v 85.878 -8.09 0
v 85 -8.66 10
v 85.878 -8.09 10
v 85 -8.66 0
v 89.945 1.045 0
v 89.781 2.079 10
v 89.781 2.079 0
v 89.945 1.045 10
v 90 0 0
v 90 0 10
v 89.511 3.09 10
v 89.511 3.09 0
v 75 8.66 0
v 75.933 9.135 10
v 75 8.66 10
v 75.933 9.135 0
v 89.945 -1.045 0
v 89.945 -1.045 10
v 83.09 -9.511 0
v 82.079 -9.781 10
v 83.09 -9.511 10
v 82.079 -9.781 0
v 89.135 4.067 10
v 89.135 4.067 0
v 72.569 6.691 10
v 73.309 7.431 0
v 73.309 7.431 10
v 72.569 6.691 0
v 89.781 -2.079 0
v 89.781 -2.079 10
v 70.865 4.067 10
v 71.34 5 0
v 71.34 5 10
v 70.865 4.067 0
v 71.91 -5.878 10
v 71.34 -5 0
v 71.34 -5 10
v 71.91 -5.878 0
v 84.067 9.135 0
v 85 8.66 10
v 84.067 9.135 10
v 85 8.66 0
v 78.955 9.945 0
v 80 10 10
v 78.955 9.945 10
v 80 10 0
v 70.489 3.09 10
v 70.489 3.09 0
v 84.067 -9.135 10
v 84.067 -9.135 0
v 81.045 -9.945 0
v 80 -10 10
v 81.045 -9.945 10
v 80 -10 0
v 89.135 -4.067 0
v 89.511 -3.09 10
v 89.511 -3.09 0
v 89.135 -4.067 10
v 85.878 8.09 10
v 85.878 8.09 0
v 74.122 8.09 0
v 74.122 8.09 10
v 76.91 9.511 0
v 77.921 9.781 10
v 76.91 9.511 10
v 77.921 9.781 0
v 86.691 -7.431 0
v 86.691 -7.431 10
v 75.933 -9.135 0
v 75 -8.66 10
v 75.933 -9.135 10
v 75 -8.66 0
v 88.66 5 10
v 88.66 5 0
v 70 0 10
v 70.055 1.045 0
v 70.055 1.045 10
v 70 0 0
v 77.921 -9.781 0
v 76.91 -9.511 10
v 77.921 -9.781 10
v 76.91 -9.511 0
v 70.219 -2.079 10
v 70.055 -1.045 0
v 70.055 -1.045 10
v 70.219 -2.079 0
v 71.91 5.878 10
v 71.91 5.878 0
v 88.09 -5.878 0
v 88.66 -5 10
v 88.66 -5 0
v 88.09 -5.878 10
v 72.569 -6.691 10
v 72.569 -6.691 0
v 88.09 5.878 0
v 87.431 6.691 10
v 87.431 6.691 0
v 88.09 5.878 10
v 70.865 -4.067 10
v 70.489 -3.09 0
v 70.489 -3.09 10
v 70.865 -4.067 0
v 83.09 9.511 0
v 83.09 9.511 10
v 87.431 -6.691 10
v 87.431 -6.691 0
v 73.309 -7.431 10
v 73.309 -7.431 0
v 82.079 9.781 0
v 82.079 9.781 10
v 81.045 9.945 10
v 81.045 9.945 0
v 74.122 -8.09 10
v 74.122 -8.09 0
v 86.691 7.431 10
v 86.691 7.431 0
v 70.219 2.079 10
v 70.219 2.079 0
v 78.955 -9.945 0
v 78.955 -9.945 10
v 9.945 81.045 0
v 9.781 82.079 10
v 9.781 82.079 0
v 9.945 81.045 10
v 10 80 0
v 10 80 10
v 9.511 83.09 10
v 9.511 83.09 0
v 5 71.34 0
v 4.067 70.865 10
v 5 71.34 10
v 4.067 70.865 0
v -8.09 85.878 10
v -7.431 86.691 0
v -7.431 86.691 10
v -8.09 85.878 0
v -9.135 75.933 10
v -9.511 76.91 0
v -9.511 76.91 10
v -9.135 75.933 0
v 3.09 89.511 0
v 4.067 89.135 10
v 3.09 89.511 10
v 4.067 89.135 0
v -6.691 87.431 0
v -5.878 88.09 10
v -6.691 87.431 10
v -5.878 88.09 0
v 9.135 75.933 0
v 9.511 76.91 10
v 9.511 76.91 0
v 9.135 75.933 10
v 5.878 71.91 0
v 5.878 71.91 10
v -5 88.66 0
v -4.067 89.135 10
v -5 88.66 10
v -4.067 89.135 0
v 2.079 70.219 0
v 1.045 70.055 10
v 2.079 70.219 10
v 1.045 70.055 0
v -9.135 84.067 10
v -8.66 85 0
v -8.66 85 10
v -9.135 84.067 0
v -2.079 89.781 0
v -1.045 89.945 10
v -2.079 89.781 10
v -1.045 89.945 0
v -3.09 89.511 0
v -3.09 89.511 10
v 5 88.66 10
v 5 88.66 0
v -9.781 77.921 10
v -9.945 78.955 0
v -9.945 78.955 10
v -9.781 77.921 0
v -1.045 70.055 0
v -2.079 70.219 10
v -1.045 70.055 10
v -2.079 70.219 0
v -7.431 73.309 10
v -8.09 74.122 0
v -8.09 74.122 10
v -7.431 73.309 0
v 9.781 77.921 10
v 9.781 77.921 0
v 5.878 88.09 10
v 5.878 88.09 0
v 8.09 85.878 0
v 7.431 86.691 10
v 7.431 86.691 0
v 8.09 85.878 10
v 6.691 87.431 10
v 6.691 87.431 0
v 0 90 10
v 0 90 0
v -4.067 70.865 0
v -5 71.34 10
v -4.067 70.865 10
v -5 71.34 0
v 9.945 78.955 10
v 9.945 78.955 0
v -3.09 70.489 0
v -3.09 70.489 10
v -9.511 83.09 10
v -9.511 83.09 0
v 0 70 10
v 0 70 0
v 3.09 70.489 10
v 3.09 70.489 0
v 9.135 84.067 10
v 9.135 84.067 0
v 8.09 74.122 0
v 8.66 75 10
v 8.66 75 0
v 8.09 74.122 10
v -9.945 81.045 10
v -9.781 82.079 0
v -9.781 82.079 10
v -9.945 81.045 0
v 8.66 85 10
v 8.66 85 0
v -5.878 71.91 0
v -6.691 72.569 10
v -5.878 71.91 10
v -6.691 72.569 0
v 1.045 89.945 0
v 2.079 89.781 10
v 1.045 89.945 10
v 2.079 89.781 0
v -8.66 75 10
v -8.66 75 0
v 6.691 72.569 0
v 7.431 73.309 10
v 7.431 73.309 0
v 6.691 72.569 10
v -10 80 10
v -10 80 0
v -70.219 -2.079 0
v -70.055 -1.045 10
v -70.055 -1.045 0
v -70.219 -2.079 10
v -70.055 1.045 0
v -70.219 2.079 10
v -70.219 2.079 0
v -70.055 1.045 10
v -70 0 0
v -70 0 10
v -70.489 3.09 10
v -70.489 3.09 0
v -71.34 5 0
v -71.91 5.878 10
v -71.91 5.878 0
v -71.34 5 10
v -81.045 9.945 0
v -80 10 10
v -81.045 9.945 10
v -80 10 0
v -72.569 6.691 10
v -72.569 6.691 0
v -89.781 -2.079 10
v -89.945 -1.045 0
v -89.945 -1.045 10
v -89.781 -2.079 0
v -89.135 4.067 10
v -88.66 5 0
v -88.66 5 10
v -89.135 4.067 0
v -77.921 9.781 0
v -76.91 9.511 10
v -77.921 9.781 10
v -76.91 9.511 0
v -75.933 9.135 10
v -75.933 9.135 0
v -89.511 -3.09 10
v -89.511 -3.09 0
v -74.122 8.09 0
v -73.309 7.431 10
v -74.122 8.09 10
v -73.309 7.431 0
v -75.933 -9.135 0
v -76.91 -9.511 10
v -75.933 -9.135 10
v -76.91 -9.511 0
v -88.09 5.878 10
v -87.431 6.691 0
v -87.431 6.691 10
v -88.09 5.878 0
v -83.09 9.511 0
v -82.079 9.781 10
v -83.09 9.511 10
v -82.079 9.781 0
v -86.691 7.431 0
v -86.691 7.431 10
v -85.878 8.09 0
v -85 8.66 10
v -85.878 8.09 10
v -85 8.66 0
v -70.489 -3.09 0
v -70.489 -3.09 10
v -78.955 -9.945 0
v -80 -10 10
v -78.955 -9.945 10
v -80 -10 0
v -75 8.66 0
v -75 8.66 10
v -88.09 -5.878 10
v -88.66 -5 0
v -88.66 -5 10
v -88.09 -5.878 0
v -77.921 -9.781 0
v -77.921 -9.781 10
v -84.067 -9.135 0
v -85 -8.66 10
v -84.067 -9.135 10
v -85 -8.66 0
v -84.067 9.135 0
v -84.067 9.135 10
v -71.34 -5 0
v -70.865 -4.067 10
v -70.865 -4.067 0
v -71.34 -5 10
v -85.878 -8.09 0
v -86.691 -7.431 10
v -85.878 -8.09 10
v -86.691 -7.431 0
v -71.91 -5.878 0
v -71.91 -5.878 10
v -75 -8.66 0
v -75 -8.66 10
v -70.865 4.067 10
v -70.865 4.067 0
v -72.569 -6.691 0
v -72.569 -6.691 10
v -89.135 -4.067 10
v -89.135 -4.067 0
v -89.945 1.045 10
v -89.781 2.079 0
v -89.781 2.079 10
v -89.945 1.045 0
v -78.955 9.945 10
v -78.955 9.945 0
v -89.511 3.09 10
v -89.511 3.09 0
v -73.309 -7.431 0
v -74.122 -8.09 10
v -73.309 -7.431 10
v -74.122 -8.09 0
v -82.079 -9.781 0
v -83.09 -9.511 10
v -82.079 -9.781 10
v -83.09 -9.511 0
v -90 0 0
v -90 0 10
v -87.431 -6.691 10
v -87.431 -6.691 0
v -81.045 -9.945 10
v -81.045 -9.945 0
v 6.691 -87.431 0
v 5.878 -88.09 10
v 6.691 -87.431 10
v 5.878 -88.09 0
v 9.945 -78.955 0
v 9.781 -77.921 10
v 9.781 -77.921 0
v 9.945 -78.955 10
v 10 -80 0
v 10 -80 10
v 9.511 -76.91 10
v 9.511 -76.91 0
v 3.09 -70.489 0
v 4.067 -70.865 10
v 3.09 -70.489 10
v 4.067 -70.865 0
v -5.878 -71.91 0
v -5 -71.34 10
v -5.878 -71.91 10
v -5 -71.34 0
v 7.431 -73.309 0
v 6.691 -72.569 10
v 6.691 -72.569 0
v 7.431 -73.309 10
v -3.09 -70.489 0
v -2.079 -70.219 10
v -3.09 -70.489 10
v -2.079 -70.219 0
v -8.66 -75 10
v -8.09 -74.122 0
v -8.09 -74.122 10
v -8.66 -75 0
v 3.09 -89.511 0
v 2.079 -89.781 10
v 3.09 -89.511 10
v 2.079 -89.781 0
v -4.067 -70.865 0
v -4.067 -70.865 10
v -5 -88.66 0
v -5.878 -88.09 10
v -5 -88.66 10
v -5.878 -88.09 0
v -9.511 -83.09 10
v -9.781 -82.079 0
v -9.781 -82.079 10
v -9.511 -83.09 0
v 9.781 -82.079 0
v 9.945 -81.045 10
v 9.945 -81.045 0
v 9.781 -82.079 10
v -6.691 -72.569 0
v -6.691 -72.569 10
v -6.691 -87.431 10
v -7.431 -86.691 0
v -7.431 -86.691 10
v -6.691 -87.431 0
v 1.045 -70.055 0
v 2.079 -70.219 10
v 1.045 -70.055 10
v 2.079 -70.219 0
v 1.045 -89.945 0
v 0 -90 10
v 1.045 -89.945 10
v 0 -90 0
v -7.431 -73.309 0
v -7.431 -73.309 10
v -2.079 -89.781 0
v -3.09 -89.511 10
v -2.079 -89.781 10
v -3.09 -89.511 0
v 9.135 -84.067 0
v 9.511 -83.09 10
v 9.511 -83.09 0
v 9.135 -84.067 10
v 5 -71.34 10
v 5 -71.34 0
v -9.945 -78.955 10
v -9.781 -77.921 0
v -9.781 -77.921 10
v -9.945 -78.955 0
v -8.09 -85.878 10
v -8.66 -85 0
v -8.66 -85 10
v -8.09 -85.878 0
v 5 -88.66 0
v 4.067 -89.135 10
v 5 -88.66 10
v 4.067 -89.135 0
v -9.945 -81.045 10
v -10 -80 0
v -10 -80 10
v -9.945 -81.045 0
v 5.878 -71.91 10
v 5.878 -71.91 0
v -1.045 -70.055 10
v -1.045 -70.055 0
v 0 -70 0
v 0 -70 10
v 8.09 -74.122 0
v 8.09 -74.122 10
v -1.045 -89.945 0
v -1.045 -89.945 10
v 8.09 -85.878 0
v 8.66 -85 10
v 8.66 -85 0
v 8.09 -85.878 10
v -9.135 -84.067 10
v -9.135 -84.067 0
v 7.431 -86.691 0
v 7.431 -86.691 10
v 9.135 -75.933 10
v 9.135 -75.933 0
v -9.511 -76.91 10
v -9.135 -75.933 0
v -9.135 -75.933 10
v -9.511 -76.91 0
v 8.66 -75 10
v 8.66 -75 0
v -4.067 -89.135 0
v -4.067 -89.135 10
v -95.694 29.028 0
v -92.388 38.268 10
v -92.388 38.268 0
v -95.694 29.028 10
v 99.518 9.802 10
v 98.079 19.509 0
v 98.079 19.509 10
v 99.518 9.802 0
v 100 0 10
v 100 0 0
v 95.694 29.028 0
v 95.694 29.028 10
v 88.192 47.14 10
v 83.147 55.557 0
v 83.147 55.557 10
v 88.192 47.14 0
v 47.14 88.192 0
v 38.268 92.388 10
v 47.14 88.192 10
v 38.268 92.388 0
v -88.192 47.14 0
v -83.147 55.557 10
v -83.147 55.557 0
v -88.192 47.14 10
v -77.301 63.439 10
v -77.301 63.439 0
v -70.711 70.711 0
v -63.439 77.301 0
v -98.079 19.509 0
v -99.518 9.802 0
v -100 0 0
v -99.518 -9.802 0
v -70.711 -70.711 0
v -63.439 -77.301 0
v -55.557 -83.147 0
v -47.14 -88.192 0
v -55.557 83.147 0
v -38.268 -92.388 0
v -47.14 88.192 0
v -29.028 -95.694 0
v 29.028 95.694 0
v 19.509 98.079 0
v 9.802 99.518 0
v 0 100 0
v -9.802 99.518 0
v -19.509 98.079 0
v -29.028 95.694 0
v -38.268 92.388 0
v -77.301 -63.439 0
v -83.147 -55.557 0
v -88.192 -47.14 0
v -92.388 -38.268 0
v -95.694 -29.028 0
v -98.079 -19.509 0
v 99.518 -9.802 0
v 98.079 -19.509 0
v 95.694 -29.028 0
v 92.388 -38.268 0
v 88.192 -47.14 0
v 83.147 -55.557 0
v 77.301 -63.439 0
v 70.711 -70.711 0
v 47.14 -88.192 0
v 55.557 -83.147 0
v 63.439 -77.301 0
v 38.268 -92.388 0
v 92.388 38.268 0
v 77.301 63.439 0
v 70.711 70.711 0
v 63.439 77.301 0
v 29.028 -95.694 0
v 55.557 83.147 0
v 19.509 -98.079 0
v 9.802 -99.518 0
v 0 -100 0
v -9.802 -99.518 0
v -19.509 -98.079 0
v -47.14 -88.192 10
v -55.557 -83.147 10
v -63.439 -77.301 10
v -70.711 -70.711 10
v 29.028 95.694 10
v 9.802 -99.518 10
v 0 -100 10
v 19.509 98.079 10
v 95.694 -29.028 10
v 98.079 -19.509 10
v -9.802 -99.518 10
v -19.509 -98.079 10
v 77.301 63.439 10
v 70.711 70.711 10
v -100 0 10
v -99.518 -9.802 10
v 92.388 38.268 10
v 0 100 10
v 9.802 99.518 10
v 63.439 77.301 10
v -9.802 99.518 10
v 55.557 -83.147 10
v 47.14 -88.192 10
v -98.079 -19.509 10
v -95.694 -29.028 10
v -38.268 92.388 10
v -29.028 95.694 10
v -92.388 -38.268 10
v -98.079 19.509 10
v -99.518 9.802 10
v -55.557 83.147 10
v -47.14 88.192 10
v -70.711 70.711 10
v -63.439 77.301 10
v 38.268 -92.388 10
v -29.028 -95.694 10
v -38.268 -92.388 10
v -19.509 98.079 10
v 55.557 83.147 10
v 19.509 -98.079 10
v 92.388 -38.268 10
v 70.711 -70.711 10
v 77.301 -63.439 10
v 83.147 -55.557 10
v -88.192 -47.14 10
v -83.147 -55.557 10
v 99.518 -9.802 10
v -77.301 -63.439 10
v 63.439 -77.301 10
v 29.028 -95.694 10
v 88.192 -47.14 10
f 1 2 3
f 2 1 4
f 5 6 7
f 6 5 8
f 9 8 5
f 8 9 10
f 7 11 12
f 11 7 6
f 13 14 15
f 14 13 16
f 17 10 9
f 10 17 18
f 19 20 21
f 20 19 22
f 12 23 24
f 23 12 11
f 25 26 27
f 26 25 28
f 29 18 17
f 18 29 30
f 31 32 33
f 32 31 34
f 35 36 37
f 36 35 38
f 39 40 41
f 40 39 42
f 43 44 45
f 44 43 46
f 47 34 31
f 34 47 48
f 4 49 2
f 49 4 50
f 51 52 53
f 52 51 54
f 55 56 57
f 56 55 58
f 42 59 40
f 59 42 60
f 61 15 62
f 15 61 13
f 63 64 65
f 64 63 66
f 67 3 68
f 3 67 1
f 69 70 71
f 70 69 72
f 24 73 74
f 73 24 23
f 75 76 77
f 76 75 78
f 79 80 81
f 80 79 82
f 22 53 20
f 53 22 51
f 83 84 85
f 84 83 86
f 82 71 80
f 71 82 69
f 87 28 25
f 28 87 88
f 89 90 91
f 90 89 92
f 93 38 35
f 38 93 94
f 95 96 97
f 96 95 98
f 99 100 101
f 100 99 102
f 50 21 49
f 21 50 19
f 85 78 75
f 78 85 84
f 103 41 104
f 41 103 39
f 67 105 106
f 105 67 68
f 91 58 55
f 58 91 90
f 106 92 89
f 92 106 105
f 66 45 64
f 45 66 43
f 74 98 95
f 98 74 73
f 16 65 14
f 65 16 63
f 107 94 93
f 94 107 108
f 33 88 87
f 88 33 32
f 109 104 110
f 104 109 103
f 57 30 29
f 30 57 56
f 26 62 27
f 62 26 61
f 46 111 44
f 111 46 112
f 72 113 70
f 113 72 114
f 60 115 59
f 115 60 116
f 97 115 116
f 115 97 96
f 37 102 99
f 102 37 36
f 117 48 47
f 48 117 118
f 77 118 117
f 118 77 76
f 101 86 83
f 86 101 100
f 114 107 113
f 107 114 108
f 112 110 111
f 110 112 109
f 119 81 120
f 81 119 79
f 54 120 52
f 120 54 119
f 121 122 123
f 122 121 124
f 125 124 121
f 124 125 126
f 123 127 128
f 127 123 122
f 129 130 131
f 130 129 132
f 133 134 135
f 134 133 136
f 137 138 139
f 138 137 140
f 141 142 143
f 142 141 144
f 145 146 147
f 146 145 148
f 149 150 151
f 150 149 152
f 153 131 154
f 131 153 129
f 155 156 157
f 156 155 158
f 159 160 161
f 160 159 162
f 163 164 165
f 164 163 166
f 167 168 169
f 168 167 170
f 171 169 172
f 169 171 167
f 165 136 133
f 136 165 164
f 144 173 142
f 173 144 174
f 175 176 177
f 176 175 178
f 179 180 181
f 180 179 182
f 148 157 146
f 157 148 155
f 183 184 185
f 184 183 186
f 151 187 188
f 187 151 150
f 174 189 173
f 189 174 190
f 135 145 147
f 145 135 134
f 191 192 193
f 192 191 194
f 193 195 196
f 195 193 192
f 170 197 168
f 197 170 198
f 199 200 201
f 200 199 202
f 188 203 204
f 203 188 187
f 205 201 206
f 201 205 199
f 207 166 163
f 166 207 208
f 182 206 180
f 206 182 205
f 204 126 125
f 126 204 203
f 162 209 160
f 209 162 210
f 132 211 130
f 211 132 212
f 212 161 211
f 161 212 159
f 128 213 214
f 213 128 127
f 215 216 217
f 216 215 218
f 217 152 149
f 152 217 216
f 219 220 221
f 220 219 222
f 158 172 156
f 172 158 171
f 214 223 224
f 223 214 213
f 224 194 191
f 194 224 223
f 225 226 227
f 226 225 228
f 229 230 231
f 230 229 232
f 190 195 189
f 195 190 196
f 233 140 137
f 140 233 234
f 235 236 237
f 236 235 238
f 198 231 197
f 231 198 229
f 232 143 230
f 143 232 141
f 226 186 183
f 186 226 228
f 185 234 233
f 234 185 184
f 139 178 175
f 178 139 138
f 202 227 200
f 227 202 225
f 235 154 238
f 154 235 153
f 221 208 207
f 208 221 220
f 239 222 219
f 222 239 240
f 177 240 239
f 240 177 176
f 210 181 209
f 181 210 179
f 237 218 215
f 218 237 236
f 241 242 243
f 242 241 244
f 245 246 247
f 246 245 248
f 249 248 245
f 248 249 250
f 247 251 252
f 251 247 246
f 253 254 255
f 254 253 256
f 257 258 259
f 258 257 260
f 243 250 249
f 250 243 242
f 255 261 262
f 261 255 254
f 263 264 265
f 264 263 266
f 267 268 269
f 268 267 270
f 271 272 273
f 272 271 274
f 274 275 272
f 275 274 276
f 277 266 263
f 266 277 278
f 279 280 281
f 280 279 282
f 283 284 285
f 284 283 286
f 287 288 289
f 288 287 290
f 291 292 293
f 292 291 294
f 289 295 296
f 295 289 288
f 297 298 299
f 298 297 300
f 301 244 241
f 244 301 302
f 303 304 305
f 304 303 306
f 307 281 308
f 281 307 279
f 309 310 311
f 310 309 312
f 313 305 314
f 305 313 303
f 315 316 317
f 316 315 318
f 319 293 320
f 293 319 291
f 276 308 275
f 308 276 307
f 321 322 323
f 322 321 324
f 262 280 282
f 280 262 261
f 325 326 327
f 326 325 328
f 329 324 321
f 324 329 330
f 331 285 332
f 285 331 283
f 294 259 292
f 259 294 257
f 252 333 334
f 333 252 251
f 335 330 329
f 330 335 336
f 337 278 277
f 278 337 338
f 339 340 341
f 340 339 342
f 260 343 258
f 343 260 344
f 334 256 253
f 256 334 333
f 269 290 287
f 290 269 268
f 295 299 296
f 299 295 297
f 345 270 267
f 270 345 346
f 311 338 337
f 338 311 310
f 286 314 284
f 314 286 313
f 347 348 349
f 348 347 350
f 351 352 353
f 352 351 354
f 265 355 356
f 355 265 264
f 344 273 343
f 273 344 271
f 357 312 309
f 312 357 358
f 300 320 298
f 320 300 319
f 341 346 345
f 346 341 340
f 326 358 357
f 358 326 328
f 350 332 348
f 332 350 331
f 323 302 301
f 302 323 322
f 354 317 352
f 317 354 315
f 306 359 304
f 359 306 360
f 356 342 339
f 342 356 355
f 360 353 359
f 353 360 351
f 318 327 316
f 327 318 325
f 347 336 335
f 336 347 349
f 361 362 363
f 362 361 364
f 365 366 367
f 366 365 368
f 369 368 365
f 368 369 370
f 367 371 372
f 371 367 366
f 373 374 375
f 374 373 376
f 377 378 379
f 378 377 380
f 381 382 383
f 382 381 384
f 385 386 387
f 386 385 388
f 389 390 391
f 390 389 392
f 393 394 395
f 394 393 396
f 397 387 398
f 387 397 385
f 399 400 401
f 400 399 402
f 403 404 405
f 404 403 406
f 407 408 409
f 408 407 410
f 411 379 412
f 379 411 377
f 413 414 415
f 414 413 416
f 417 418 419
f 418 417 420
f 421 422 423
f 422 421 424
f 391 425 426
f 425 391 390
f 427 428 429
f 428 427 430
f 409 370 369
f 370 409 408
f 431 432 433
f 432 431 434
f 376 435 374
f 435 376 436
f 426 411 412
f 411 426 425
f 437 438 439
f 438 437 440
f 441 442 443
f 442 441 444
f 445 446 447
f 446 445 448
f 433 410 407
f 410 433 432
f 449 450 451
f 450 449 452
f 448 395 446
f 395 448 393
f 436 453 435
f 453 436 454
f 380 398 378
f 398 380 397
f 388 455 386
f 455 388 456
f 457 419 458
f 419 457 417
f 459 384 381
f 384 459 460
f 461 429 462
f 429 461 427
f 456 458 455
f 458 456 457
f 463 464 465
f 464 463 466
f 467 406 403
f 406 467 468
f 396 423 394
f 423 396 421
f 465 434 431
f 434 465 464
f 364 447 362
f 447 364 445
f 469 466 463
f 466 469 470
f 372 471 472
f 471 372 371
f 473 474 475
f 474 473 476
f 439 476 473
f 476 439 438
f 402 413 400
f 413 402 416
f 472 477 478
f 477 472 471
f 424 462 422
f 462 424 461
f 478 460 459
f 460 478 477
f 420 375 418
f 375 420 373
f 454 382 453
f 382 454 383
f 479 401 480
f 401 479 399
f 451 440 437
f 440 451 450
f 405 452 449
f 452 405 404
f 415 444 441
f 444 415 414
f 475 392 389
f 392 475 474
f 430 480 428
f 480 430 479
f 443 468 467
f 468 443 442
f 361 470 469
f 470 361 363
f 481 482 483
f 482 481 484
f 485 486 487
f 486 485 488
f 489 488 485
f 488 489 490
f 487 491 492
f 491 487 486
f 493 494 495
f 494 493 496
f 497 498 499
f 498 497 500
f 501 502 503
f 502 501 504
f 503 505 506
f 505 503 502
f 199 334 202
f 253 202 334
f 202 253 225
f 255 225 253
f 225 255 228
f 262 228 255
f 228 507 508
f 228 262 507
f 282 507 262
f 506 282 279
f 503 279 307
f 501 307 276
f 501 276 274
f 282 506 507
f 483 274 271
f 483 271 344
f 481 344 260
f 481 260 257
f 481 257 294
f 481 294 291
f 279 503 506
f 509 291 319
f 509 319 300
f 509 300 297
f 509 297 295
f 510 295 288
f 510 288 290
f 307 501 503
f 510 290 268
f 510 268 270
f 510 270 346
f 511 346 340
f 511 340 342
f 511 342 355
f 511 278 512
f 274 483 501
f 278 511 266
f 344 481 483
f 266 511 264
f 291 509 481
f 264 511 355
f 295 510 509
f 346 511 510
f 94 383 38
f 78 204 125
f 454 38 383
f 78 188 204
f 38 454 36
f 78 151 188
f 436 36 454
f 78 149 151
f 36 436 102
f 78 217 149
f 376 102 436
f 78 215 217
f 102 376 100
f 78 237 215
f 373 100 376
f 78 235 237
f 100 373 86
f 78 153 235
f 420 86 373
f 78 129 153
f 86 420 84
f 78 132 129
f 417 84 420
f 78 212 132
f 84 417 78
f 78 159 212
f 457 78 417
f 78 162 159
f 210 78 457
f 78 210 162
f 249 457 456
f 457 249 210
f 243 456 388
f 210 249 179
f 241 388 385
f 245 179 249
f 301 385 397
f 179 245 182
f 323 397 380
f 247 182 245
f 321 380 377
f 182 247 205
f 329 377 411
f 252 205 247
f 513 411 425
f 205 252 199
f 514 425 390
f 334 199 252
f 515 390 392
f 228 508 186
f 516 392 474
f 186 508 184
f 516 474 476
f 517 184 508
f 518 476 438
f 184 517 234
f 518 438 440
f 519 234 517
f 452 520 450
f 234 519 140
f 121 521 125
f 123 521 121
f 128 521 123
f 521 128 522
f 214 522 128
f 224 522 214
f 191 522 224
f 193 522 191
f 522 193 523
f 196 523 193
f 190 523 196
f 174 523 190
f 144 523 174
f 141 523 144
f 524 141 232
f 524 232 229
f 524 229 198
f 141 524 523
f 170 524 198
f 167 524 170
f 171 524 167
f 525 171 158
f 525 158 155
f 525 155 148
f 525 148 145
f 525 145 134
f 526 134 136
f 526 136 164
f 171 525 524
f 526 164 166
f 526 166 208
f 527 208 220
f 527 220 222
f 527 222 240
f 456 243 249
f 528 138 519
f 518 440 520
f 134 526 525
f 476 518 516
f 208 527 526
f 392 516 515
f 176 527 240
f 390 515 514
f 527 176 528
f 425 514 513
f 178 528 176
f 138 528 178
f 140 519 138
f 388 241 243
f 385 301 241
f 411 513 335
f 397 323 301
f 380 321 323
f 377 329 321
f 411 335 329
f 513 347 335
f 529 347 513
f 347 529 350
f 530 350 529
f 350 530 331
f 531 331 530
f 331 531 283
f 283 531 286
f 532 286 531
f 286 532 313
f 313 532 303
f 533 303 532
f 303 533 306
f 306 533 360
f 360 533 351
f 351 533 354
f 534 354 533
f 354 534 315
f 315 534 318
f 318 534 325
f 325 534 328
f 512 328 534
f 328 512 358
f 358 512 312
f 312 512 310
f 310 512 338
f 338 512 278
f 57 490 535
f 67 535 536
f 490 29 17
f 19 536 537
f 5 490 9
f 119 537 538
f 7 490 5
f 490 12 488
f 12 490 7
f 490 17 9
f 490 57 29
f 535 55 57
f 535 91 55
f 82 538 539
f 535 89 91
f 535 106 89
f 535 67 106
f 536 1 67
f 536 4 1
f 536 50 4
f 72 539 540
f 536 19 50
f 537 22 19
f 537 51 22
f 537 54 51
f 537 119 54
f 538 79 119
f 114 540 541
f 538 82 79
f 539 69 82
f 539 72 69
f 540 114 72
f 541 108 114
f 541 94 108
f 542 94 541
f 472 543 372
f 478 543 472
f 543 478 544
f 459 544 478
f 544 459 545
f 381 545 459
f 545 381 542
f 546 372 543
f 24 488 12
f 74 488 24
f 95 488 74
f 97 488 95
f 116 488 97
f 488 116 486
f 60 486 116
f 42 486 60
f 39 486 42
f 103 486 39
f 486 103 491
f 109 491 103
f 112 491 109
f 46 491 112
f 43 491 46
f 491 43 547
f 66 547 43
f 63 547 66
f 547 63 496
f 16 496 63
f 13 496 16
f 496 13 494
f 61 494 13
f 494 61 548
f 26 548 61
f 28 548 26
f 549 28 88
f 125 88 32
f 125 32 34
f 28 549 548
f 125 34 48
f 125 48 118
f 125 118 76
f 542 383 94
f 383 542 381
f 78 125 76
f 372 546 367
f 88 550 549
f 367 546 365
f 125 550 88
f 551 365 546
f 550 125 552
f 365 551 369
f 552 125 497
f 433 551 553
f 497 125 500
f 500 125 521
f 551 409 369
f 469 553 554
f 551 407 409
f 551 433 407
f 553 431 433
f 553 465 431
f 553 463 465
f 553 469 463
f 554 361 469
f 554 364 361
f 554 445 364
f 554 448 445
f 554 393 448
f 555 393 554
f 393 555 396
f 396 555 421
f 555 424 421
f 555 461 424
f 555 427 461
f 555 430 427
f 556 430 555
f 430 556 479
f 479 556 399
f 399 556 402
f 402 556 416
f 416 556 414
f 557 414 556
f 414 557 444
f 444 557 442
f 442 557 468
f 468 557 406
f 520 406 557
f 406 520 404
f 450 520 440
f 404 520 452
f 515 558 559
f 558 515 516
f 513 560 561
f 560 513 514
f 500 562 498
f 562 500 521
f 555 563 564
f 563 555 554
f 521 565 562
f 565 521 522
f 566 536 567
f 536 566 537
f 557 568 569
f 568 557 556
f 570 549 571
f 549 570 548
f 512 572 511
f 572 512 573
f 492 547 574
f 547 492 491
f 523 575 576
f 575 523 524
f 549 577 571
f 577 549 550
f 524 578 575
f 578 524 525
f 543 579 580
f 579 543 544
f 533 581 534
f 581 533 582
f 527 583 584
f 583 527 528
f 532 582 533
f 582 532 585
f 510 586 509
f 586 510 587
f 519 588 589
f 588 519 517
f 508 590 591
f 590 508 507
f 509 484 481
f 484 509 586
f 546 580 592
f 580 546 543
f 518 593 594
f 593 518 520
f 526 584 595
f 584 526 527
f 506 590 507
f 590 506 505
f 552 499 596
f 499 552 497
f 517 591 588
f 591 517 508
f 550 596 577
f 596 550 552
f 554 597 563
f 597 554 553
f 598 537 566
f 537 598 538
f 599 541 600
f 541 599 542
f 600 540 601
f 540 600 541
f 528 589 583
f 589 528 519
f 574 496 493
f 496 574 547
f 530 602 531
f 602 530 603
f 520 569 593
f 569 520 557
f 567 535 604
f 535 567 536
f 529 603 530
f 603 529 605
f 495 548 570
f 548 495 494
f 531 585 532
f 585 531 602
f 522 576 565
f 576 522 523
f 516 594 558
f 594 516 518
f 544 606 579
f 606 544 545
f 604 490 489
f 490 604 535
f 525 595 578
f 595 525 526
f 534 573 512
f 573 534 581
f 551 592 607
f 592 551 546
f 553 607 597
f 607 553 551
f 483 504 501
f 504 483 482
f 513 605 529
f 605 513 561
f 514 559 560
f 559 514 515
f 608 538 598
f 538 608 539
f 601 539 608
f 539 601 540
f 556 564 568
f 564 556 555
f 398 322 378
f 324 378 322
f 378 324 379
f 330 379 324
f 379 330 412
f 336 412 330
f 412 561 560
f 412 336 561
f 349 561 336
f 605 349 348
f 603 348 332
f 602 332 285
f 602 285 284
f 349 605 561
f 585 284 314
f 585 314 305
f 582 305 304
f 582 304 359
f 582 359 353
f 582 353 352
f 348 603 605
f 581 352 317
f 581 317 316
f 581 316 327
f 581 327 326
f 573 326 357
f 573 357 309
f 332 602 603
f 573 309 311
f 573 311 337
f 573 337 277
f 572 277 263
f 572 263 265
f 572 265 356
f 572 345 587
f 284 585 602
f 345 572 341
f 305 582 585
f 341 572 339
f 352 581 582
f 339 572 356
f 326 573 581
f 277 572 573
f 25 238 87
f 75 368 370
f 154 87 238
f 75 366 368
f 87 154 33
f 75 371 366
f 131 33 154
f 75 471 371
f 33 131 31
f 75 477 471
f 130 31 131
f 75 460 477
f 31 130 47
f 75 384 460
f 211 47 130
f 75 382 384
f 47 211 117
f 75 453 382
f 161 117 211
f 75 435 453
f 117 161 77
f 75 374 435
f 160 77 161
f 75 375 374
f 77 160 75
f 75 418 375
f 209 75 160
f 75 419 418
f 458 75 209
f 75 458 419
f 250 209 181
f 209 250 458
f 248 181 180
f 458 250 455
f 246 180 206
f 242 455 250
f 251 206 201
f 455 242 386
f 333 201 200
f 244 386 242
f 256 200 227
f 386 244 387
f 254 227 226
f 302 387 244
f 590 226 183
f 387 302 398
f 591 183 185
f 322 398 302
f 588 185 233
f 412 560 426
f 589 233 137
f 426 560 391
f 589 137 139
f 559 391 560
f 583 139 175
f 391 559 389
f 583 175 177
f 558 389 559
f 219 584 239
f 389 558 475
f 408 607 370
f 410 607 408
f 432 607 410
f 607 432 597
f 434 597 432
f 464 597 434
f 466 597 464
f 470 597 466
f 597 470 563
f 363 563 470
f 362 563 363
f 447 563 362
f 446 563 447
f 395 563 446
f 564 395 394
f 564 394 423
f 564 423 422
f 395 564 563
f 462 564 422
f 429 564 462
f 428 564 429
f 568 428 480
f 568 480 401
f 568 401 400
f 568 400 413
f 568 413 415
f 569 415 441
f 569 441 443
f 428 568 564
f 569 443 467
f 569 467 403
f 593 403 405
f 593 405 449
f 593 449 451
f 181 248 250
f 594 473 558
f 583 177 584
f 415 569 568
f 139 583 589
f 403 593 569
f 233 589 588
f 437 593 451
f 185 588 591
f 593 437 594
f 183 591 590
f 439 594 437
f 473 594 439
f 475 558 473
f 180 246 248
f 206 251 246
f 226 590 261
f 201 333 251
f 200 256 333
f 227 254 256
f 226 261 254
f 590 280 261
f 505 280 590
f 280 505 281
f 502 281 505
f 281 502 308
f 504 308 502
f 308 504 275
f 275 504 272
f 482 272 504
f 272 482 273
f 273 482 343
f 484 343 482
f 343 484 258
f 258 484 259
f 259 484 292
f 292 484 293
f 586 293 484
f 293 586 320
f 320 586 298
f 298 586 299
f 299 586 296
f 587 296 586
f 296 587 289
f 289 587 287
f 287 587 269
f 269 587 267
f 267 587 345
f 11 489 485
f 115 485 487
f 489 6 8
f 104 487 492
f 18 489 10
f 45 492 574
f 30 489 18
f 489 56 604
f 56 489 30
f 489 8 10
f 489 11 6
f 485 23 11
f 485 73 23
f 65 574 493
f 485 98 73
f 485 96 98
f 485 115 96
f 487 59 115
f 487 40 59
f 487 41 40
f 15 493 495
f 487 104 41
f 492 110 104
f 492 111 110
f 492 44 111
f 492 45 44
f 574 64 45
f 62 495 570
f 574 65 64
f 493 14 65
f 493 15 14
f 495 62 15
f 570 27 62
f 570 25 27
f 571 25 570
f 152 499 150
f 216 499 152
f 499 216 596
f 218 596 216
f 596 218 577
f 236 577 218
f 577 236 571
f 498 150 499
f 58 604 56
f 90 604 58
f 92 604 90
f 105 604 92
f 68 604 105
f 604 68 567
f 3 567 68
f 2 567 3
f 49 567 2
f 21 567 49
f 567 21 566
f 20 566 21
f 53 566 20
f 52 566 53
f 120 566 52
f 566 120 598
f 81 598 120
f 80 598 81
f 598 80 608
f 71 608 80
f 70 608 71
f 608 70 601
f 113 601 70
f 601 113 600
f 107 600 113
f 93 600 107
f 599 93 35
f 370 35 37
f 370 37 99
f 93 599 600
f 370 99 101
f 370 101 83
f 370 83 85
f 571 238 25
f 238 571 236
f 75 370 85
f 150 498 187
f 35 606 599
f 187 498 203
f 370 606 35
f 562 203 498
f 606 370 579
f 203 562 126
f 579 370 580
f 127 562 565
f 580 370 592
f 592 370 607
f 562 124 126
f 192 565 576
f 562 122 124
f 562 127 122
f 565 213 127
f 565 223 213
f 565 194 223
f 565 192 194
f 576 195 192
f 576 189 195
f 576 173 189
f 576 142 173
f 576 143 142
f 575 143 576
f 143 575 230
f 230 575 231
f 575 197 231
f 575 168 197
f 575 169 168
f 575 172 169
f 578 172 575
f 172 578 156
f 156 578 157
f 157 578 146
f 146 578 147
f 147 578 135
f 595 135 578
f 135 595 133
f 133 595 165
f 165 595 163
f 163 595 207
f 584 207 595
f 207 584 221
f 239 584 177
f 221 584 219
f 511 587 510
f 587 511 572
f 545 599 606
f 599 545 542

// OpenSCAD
module Flange_02(Size = 0){
    color("#c0c6c7");
    Dext= 100;
    Thickness = 10;
    
    //echo(DN);
    DN10 =[100,10];     
    DN25 = [120,15];
    DN50 = [130,20];

    Flange = [DN10,DN25,DN50];

    difference(){
        cylinder(Flange[Size][1],Flange[Size][0],Flange[Size][0], $fn = $preview ? 32 : 64);
        r = 80;
        for (i=[0:90:359]) {
            translate([r*cos(i),r*sin(i),-1])
            cylinder(12,10,10,$fn=60);
            }
    }
}

Flange_02(Size = 0);


// Written by Nicolì Angelo (Gengio) 2024: 
// MIT License

//Permission is hereby granted, free of charge, to any person obtaining a copy of this software and associated documentation files (the "Software"), to deal in the Software without restriction, including without limitation the rights to use, copy, modify, merge, publish, distribute, sublicense, and/or sell copies of the Software, and to permit persons to whom the Software is furnished to do so, subject to the following conditions:

//The above copyright notice and this permission notice shall be included in all copies or substantial portions of the Software.

//THE SOFTWARE IS PROVIDED "AS IS", WITHOUT WARRANTY OF ANY KIND, EXPRESS OR IMPLIED, INCLUDING BUT NOT LIMITED TO THE WARRANTIES OF MERCHANTABILITY, FITNESS FOR A PARTICULAR PURPOSE AND NONINFRINGEMENT. IN NO EVENT SHALL THE AUTHORS OR COPYRIGHT HOLDERS BE LIABLE FOR ANY CLAIM, DAMAGES OR OTHER LIABILITY, WHETHER IN AN ACTION OF CONTRACT, TORT OR OTHERWISE, ARISING FROM, OUT OF OR IN CONNECTION WITH THE SOFTWARE OR THE USE OR OTHER DEALINGS IN THE SOFTWARE.
